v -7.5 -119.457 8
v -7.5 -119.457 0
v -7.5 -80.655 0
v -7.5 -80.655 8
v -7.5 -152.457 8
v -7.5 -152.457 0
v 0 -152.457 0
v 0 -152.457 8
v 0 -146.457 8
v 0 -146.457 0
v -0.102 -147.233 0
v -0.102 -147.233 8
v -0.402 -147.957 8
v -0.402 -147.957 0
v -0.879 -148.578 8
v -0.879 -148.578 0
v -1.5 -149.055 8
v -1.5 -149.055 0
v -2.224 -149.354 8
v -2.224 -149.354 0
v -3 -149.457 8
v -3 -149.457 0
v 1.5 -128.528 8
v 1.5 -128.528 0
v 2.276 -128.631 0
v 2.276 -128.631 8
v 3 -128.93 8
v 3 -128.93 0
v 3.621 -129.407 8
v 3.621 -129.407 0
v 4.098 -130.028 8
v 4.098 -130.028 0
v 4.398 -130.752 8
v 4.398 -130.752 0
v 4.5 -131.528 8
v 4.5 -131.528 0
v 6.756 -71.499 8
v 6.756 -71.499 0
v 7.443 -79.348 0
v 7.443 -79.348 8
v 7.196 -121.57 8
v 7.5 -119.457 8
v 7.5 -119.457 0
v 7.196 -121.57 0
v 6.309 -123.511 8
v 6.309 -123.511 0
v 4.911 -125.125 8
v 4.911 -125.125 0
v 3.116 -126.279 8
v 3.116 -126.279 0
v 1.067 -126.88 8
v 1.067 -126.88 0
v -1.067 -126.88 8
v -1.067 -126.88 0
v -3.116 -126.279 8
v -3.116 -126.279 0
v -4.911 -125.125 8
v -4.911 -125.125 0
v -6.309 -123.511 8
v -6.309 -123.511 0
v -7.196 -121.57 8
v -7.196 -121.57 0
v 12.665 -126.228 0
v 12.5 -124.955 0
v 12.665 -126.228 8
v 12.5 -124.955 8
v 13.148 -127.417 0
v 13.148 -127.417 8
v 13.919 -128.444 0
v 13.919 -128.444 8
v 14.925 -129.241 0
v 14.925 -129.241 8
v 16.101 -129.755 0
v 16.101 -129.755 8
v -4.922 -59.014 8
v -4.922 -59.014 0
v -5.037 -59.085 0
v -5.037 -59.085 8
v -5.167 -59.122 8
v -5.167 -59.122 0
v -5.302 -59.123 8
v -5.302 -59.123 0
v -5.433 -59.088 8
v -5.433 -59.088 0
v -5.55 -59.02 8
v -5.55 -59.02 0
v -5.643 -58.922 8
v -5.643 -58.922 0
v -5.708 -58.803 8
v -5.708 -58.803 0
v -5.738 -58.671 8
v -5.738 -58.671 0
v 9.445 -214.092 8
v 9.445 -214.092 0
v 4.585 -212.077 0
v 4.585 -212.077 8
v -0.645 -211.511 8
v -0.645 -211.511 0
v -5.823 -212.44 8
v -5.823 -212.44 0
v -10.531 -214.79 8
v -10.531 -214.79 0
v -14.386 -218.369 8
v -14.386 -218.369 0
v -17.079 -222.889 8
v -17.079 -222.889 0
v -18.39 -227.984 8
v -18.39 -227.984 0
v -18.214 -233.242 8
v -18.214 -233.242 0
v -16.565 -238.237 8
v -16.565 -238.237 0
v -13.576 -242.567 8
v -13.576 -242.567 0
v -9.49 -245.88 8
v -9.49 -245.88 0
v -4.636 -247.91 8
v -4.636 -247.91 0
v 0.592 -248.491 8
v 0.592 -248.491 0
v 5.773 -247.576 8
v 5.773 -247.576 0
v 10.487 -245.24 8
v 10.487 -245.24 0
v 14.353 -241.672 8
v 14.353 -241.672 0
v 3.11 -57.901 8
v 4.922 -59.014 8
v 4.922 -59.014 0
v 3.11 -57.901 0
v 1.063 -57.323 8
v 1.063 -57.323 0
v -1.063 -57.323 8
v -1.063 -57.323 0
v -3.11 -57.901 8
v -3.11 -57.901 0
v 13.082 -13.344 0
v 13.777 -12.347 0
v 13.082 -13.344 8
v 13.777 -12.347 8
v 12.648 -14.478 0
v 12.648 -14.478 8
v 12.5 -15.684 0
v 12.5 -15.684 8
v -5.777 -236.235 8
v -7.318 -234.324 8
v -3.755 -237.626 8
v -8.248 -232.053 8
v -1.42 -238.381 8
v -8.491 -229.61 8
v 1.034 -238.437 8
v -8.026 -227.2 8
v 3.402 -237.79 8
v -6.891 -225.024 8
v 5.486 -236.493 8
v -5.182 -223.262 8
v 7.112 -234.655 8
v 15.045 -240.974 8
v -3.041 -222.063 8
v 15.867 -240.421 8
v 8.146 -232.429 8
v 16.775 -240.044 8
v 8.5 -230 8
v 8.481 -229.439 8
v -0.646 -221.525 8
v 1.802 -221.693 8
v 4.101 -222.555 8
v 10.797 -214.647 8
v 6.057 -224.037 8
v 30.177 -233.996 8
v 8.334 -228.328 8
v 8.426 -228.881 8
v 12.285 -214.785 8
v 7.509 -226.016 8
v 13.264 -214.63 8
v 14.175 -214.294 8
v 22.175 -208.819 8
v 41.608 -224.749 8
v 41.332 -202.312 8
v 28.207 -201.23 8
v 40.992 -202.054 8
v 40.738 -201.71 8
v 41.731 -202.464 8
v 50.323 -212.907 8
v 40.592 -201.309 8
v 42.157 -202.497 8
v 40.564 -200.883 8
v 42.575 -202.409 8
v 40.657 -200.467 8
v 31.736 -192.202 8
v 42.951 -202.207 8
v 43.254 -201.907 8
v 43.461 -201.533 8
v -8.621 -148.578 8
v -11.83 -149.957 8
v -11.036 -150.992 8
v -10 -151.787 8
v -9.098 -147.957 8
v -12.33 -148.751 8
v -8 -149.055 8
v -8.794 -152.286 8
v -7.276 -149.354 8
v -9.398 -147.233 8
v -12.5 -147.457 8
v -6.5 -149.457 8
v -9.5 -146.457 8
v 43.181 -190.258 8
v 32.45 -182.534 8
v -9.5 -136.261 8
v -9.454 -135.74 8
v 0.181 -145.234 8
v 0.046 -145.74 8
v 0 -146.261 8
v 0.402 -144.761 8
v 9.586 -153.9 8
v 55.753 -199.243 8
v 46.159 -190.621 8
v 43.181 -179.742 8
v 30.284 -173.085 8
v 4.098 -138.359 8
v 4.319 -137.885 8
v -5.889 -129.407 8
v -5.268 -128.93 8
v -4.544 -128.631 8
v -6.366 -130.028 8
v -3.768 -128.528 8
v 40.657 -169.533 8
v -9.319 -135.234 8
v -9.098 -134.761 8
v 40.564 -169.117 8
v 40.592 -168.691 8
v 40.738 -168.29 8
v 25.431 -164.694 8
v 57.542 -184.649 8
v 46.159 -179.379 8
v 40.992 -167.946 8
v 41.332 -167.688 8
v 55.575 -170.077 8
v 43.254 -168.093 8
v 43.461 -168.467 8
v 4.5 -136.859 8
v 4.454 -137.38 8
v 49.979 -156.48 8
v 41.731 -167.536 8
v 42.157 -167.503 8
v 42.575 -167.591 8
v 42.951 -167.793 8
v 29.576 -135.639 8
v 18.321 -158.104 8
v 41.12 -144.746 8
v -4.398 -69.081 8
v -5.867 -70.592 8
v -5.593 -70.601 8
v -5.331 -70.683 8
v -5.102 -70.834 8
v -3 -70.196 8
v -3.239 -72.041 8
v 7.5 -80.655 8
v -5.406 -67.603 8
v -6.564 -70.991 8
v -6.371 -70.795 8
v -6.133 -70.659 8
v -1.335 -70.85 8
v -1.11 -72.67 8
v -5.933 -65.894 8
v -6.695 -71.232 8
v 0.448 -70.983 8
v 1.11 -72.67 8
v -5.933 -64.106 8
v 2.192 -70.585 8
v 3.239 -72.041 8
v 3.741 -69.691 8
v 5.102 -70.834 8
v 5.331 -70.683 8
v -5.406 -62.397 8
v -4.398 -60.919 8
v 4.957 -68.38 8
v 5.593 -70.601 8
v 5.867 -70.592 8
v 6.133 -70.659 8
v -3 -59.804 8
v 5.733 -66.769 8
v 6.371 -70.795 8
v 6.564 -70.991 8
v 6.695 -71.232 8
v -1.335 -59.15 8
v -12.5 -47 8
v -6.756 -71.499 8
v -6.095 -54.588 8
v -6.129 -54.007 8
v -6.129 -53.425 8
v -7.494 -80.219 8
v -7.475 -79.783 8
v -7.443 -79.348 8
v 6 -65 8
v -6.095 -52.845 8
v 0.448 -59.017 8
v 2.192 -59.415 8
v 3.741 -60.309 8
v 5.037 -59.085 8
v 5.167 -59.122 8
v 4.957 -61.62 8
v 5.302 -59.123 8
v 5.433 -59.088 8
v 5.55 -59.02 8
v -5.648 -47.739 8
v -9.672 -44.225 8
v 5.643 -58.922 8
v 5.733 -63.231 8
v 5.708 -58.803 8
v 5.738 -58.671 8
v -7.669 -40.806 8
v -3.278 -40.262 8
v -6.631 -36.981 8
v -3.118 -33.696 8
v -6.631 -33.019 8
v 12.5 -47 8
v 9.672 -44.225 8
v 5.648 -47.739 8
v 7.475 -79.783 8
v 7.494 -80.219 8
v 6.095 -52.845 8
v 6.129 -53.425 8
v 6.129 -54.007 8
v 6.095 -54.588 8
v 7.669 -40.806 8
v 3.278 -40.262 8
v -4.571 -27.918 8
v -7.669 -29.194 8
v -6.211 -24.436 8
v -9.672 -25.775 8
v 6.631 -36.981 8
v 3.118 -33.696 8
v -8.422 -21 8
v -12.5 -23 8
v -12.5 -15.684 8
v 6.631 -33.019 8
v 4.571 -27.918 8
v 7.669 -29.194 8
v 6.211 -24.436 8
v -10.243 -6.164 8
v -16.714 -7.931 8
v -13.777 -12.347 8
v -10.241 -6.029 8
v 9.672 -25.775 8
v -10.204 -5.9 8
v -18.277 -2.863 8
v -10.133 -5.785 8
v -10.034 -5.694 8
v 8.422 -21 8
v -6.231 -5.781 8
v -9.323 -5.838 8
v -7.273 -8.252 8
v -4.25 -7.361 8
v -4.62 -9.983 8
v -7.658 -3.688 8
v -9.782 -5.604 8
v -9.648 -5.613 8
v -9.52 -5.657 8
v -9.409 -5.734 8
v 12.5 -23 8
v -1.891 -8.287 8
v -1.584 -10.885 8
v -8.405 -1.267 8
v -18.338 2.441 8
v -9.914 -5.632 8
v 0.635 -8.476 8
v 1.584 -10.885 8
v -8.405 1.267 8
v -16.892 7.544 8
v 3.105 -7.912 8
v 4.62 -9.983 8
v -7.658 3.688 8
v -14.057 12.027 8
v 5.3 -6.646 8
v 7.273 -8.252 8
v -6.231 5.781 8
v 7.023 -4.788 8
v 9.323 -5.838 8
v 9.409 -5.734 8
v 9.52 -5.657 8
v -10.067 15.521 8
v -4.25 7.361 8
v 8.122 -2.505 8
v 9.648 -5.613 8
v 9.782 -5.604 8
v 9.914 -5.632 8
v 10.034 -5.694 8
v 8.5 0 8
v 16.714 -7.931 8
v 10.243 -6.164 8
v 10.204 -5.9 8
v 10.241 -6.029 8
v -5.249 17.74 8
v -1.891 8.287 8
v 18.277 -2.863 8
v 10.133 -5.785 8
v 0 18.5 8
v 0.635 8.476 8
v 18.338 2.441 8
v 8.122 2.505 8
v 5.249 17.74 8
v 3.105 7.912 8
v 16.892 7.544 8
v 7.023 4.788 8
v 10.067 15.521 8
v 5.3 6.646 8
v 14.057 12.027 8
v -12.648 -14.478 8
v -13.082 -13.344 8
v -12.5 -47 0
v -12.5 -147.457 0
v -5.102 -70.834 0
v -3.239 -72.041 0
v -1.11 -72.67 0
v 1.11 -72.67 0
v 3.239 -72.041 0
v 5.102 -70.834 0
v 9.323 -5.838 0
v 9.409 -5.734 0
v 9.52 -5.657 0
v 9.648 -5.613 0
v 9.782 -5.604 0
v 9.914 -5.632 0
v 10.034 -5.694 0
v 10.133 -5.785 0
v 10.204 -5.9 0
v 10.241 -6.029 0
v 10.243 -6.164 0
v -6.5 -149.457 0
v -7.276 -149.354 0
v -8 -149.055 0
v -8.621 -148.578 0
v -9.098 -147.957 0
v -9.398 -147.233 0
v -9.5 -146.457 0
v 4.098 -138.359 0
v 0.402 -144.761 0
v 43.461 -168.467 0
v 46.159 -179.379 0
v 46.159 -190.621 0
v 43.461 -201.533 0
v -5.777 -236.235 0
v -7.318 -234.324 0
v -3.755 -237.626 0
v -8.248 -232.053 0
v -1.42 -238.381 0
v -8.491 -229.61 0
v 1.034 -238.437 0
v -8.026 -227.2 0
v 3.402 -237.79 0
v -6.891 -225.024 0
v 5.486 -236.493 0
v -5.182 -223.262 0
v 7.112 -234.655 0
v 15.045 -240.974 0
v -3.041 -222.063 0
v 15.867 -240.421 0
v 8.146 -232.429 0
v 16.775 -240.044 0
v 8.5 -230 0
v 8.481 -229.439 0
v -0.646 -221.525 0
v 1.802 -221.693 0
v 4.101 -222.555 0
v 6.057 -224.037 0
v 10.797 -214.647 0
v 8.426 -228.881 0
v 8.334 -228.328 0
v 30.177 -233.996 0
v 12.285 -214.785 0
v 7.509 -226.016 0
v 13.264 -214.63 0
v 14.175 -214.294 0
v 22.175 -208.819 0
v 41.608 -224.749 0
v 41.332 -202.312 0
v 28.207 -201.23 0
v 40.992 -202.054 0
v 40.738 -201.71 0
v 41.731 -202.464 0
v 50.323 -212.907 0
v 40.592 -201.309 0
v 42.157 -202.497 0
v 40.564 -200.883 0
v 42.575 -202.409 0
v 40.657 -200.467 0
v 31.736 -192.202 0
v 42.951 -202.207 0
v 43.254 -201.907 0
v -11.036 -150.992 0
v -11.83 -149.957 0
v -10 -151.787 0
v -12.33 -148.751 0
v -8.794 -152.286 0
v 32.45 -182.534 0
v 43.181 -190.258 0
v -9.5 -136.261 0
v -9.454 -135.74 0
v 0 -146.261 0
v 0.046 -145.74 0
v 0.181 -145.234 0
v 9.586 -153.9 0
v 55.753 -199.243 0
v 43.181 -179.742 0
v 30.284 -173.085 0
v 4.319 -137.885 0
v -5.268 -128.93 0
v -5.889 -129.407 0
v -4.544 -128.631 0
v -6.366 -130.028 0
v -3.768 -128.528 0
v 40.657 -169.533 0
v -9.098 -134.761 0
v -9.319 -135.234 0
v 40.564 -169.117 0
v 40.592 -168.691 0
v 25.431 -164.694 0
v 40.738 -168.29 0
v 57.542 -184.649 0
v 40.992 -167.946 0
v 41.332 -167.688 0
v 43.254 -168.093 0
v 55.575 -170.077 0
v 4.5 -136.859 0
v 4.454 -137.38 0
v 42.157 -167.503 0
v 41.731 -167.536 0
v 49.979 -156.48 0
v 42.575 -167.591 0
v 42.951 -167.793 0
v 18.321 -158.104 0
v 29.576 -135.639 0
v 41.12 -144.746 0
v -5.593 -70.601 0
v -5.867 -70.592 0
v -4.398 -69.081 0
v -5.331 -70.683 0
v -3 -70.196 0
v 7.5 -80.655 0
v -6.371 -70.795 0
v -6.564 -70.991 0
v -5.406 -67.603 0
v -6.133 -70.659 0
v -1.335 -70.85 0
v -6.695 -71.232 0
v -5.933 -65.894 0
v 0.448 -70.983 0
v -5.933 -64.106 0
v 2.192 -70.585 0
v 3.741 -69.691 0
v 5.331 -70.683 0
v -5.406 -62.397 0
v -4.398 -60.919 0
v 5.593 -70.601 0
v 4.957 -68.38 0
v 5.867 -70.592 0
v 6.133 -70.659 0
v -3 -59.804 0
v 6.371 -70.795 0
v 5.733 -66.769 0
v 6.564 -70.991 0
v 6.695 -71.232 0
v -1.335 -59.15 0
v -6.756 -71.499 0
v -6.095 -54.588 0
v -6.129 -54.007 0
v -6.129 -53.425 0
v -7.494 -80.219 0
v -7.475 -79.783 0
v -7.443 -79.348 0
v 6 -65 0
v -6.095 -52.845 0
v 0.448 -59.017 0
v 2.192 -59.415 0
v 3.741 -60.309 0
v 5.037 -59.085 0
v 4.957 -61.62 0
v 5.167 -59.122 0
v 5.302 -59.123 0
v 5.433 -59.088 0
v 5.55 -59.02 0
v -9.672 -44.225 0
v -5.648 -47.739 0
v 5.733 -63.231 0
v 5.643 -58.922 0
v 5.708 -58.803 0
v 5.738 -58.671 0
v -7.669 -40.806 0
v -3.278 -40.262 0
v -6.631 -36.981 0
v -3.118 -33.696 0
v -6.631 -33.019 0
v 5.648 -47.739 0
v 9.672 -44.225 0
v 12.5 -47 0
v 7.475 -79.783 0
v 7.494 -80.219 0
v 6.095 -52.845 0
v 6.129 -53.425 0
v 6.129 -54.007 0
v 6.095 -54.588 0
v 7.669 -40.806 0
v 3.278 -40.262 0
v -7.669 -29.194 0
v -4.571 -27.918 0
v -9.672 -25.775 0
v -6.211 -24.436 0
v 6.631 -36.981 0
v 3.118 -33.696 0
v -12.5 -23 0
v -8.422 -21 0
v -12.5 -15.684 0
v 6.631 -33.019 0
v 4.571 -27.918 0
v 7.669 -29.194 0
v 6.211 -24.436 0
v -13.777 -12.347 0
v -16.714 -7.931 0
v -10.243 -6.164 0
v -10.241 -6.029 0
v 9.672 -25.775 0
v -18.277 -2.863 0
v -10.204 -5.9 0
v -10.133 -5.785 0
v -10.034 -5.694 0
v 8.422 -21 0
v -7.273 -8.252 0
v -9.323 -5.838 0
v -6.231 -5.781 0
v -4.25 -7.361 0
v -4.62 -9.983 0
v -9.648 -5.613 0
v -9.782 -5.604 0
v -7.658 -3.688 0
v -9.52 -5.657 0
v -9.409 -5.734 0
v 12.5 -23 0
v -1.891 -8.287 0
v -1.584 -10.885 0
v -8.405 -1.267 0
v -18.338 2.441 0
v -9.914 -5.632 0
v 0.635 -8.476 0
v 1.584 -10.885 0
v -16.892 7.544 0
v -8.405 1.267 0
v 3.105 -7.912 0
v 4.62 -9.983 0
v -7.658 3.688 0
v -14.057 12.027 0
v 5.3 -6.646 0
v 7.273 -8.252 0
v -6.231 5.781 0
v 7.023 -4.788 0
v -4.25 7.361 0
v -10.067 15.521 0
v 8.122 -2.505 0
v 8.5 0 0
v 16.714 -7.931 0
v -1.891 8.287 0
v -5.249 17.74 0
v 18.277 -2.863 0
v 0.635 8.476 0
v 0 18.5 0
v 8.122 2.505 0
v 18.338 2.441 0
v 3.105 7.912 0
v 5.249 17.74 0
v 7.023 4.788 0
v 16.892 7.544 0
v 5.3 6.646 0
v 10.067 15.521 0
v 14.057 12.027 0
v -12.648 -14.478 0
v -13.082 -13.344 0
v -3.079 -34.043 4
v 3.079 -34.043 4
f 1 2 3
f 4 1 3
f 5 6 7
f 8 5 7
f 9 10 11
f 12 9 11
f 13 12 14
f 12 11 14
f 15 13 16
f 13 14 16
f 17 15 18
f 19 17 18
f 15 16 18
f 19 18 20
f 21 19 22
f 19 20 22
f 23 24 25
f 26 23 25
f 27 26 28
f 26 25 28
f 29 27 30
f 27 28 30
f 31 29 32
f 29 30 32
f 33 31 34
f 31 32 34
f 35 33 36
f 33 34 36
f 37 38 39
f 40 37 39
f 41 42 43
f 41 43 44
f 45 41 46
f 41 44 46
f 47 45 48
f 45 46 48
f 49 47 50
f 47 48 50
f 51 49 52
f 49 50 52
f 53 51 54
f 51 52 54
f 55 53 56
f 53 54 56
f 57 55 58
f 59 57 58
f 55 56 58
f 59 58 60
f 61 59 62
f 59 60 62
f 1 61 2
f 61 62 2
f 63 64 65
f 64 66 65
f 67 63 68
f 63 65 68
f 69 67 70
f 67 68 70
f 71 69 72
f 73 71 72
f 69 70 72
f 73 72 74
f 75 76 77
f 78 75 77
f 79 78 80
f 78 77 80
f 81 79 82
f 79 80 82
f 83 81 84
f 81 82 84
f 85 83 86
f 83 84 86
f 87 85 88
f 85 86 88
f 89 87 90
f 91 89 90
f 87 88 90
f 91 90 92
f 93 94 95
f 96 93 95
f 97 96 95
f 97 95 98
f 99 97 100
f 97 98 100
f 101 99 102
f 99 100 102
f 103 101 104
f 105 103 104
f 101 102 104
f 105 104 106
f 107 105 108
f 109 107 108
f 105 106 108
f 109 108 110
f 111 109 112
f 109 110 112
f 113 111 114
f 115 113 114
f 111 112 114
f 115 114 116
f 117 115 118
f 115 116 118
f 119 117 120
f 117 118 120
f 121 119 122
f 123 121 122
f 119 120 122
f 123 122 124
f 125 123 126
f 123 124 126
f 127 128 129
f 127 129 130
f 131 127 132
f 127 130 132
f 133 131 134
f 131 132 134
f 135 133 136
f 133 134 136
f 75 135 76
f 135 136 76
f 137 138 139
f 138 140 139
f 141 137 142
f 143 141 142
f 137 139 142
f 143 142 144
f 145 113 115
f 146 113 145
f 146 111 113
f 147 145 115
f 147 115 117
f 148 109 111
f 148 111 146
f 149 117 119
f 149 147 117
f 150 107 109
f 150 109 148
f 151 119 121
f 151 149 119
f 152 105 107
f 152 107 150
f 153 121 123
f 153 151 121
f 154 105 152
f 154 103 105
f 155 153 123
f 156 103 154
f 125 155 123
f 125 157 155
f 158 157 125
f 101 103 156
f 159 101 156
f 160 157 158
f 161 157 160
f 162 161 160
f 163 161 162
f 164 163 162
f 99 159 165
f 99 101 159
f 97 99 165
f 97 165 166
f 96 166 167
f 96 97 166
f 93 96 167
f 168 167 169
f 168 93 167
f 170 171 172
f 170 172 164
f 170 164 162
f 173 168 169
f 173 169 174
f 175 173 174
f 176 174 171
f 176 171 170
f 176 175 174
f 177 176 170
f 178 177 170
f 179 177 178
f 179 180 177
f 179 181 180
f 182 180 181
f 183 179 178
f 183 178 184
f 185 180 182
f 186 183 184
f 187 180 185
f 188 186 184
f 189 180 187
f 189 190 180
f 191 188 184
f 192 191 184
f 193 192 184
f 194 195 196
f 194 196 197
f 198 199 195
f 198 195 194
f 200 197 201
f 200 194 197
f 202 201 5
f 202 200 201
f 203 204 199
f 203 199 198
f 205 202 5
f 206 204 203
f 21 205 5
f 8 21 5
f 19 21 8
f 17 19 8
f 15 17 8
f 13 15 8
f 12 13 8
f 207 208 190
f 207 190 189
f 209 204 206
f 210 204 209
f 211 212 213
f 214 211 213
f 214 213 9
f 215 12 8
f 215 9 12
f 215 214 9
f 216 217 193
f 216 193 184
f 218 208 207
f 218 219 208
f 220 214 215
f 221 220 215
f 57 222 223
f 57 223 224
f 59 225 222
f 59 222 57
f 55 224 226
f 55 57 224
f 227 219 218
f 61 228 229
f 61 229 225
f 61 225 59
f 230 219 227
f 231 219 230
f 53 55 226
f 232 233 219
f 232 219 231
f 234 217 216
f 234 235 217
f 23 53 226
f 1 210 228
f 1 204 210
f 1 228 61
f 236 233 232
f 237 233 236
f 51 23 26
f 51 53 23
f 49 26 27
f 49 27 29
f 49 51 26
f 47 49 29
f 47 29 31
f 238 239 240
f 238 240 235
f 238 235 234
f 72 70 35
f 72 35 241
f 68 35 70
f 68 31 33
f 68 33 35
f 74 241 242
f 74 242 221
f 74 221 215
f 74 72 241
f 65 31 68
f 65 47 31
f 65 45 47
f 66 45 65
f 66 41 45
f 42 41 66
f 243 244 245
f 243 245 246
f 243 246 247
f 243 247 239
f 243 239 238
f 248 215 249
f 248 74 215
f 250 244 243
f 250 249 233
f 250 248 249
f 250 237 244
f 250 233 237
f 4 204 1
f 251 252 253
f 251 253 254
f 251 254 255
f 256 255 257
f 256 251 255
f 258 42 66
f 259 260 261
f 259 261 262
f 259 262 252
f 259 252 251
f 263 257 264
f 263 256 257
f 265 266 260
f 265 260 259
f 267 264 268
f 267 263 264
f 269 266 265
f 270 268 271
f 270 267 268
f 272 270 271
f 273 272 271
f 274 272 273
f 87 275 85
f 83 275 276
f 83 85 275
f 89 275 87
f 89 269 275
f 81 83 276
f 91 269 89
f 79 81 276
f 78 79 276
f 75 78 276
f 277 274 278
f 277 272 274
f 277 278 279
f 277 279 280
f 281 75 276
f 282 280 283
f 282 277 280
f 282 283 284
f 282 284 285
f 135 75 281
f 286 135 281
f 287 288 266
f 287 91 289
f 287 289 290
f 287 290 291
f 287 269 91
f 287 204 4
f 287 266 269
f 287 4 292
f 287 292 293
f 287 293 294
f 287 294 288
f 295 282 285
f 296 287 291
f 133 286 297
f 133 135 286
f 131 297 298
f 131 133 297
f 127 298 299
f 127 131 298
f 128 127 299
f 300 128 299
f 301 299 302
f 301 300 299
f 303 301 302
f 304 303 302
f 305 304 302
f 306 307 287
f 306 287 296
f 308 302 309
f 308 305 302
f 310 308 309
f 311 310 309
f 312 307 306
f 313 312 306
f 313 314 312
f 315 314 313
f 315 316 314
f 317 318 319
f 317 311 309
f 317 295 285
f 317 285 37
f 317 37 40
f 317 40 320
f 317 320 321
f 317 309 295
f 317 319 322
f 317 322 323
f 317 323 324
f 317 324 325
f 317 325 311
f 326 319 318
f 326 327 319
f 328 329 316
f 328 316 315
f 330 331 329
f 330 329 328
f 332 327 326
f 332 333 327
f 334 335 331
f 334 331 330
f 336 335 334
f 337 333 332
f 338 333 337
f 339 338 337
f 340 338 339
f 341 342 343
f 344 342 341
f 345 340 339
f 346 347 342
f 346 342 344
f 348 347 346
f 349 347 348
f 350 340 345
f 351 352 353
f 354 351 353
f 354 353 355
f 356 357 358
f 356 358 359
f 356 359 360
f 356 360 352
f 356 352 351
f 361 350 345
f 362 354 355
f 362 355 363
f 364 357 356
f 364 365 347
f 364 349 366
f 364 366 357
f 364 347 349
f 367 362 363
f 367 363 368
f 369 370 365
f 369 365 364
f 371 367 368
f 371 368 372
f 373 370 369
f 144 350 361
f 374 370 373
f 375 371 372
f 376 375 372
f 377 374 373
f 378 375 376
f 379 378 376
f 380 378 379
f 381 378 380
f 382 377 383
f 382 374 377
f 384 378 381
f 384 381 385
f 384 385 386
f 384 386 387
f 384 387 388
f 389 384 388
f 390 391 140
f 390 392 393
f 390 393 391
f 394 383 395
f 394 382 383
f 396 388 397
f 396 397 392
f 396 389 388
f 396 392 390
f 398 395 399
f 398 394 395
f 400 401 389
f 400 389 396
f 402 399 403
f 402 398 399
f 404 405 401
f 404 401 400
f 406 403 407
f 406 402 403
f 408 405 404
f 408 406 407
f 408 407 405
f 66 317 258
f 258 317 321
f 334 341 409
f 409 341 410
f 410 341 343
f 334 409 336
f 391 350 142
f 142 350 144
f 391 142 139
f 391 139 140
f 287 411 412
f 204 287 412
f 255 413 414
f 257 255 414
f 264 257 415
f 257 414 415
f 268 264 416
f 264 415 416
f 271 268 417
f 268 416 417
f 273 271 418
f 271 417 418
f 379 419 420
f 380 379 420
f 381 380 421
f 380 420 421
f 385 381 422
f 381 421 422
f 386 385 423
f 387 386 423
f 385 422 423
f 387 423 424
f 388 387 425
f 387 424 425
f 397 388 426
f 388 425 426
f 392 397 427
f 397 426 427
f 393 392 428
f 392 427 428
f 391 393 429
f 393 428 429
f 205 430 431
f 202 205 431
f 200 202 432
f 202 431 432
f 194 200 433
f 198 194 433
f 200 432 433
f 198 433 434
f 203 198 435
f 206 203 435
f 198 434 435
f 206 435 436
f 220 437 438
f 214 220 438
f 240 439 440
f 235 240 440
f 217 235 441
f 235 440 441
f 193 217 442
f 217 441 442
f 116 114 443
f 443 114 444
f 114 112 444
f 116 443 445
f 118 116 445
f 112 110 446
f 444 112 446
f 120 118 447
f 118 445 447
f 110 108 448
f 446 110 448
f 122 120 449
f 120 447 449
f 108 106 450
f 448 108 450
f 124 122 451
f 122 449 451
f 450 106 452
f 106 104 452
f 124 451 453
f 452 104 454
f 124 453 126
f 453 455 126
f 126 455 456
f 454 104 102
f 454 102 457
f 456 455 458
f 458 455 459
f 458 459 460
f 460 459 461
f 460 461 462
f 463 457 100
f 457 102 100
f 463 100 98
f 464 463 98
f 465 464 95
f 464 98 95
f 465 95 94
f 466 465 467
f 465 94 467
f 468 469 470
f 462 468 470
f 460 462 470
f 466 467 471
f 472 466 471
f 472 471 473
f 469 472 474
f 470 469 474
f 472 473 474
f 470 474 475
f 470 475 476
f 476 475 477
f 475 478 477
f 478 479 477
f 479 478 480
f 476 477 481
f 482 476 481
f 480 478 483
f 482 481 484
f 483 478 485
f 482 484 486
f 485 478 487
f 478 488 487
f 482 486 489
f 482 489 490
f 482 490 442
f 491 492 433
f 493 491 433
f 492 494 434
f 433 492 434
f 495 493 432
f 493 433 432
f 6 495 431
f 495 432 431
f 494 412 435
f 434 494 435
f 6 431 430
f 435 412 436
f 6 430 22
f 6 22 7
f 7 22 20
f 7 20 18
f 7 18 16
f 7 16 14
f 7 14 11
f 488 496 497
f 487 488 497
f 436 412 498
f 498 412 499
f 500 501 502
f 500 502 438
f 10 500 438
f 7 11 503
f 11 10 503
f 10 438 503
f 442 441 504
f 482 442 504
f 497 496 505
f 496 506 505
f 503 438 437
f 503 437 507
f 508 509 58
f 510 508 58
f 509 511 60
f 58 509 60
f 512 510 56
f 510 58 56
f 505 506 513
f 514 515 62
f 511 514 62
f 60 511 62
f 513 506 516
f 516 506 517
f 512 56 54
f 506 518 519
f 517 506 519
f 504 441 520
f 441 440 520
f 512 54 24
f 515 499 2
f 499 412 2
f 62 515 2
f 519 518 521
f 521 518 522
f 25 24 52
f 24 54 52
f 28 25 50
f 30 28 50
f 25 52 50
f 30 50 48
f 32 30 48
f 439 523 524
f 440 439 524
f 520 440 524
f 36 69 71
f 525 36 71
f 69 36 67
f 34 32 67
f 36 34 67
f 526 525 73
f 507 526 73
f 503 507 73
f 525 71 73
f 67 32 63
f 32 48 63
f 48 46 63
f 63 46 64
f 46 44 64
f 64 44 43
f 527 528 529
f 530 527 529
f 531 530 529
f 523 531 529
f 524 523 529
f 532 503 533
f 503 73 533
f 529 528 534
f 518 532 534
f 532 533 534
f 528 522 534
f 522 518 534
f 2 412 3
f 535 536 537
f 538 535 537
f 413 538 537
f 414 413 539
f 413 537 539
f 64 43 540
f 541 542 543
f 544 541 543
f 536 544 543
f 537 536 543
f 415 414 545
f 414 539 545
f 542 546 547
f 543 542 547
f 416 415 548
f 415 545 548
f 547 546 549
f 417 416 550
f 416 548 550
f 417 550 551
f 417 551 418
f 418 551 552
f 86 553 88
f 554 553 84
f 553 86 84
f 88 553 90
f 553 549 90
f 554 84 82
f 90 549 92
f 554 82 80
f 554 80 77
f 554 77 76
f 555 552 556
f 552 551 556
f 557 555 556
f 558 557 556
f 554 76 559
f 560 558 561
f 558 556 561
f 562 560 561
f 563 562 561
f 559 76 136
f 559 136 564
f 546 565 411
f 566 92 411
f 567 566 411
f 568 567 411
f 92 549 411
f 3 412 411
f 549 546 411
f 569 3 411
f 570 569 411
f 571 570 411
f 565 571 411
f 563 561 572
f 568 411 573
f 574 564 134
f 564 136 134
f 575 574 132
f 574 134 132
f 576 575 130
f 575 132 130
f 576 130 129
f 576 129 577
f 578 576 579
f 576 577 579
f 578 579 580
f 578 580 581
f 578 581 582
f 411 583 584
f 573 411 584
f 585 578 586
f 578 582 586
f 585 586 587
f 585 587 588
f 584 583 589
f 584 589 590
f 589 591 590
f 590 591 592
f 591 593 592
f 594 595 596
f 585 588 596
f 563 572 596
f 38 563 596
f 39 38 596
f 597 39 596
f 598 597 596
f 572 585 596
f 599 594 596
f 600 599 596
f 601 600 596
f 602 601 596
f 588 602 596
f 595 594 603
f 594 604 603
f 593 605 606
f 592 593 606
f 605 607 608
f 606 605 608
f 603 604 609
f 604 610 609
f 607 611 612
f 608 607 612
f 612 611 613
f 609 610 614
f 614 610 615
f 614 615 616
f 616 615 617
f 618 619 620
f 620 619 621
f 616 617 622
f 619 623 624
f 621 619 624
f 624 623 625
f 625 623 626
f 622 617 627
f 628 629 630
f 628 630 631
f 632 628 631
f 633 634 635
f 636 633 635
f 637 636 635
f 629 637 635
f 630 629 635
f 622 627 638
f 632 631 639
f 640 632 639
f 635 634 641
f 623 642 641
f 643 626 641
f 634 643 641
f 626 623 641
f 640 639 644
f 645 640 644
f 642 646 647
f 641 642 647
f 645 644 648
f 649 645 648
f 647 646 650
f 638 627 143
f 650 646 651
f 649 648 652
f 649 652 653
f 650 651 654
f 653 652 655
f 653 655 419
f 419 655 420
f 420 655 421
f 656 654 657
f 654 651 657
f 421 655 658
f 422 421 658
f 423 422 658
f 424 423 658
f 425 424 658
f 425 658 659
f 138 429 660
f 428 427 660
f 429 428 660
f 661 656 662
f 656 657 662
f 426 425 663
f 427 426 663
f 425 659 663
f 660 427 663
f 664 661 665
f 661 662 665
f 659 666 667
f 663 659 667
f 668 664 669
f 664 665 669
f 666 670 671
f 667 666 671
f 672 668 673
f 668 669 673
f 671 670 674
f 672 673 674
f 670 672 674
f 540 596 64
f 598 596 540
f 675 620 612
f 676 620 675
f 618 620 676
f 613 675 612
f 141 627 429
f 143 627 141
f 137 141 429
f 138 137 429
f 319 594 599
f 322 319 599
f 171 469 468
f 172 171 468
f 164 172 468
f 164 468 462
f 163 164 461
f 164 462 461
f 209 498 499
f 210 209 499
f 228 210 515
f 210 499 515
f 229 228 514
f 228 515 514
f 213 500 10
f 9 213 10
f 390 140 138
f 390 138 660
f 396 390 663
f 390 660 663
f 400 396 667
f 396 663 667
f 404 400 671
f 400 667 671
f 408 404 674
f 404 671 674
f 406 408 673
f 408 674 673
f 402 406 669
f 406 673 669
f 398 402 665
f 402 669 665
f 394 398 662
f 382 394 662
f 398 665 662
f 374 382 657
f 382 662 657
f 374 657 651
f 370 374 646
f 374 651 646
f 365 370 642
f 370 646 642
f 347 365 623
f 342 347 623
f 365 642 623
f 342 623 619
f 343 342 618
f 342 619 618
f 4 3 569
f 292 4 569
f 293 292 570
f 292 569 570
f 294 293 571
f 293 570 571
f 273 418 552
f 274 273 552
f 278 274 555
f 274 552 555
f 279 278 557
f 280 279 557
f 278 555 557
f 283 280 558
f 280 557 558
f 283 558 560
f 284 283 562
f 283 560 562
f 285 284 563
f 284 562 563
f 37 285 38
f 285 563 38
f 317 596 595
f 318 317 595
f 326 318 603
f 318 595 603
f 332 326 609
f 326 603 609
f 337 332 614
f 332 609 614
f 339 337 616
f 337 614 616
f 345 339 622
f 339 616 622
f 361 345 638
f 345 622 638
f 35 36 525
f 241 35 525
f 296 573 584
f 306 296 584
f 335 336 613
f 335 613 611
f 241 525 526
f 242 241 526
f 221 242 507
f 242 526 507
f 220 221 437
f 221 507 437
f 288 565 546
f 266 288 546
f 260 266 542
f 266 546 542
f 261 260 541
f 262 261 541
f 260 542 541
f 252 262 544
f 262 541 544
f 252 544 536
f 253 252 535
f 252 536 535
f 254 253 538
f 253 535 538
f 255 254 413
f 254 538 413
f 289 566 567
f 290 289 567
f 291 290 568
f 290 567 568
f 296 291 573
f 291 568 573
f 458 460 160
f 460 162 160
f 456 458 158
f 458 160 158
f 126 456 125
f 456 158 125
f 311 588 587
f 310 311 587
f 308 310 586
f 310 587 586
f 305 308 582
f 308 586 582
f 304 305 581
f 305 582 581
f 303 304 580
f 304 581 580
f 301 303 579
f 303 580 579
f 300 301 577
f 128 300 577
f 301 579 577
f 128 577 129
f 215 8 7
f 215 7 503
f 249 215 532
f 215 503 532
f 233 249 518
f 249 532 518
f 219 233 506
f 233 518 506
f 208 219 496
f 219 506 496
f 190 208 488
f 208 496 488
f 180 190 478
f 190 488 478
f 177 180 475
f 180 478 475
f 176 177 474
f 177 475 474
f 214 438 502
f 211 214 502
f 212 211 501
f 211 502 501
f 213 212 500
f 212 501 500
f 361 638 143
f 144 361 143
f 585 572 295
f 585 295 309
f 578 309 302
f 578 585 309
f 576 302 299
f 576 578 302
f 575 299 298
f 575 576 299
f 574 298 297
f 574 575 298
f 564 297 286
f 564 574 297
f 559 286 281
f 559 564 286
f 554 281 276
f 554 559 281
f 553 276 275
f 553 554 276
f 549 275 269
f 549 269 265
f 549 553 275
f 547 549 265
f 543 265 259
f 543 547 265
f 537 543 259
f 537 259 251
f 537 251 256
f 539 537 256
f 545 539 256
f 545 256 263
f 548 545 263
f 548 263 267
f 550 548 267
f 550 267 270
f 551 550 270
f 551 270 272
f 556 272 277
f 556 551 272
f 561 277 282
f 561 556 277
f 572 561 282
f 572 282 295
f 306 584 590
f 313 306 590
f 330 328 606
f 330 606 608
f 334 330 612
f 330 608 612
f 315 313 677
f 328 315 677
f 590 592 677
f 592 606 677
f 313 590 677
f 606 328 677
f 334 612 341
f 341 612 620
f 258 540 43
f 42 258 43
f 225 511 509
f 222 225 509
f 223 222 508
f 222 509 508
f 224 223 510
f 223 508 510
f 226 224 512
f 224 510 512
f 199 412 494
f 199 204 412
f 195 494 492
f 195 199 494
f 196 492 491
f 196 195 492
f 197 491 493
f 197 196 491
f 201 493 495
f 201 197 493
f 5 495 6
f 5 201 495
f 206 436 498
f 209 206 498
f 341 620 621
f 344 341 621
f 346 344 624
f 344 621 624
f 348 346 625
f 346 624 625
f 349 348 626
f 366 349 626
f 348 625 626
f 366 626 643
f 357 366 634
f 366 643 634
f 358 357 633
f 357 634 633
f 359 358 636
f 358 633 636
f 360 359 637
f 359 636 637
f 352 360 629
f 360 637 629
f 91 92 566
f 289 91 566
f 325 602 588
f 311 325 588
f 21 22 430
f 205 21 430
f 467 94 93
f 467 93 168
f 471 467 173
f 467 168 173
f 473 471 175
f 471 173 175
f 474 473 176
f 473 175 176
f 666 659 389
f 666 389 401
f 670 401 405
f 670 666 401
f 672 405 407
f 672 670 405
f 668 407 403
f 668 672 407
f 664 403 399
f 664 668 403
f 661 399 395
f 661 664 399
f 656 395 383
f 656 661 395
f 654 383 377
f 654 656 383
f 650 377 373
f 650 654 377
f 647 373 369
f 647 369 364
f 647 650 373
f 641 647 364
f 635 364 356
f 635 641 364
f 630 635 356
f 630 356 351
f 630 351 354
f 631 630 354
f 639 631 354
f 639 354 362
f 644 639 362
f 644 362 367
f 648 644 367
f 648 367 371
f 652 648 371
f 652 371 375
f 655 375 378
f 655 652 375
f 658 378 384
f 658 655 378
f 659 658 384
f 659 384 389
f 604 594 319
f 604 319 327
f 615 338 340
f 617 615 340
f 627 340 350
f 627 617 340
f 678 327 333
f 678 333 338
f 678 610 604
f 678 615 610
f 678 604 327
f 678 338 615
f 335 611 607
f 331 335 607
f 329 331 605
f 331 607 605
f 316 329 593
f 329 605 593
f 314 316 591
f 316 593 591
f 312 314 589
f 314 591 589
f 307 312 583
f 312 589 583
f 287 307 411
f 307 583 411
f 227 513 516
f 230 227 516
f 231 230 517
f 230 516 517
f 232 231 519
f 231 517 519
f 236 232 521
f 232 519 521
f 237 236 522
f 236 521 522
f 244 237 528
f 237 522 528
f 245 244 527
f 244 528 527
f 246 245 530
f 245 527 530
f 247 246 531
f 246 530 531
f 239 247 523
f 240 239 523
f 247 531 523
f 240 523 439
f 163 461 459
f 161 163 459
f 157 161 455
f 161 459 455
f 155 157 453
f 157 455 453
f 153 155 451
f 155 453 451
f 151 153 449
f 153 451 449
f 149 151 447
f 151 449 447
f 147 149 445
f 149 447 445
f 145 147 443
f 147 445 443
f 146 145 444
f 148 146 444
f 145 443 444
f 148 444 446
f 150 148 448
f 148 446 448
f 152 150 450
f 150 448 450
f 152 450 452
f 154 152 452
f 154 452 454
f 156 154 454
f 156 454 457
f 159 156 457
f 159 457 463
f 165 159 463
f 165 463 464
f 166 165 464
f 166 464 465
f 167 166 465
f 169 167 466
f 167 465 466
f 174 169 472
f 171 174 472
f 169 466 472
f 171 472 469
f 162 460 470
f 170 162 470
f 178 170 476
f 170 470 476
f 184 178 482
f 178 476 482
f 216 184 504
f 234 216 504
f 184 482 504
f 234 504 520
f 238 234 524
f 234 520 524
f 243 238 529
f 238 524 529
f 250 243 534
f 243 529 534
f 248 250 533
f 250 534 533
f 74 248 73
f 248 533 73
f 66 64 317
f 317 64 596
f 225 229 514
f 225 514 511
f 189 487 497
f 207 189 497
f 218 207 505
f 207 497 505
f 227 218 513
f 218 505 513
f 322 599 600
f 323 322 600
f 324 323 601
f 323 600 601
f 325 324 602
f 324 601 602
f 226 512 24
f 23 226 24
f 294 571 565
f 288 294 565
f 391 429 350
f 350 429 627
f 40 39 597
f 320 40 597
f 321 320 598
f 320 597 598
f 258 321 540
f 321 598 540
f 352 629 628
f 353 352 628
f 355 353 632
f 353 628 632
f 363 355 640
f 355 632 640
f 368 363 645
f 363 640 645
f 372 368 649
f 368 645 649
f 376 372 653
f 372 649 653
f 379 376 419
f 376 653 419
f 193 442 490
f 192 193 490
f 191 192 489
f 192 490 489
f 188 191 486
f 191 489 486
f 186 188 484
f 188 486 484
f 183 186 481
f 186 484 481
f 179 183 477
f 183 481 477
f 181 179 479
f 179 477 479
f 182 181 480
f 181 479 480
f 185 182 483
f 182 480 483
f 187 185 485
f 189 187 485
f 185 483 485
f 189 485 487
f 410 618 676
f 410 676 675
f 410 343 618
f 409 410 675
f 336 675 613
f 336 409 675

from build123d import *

# Parameters (mm, degrees)
SKETCH1_R           = 6
SKETCH1_R_2         = 8.5
BOSS_EXTRUDE1_DEPTH = 8
FILLET1_R           = 5


with BuildPart() as part:
    # Sketch1 → Boss-Extrude1 (new body)
    with BuildSketch(Plane.XY):
        with BuildLine():
            ThreePointArc((12.5, -13.638181697), (0, 18.5), (-12.5, -13.638181697))
            Line((-12.5, -13.638181697), (-12.5, -23))
            ThreePointArc((-12.5, -23), (-6.5, -35), (-12.5, -47))
            Line((-12.5, -47), (-12.5, -152.456671403))
            Line((-12.5, -152.456671403), (0, -152.456671403))
            ThreePointArc((0, -152.456671403), (32.019441409, -179.184193262), (11.444366088, -215.464647068))
            ThreePointArc((11.444366088, -215.464647068), (-18.29086587, -232.773846738), (15.239317045, -240.488718511))
            ThreePointArc((15.239317045, -240.488718511), (57.52601951, -183.58870793), (12.5, -128.830749818))
            Line((12.5, -128.830749818), (12.5, -47))
            ThreePointArc((12.5, -47), (6.5, -35), (12.5, -23))
            Line((12.5, -23), (12.5, -13.638181697))
        make_face()
        with BuildLine():
            ThreePointArc((8.333859781, -228.327642037), (8.458362966, -229.159704854), (8.5, -230))
            ThreePointArc((8.5, -230), (-8.458362966, -230.840295146), (8.333859781, -228.327642037))
        make_face(mode=Mode.SUBTRACT)
        with BuildLine():
            ThreePointArc((0, -146.456671403), (-0.878679656, -148.577991747), (-3, -149.456671403))
            Line((-3, -149.456671403), (-6.5, -149.456671403))
            ThreePointArc((-6.5, -149.456671403), (-8.621320344, -148.577991747), (-9.5, -146.456671403))
            Line((-9.5, -146.456671403), (-9.5, -136.26051898))
            ThreePointArc((-9.5, -136.26051898), (-9.397777479, -135.484061845), (-9.098076211, -134.76051898))
            Line((-9.098076211, -134.76051898), (-6.366025404, -130.028468173))
            ThreePointArc((-6.366025404, -130.028468173), (-5.267949192, -128.930391962), (-3.767949192, -128.528468173))
            Line((-3.767949192, -128.528468173), (1.5, -128.528468173))
            ThreePointArc((1.5, -128.528468173), (3.621320344, -129.407147829), (4.5, -131.528468173))
            Line((4.5, -131.528468173), (4.5, -136.858595192))
            ThreePointArc((4.5, -136.858595192), (4.397777479, -137.635052327), (4.098076211, -138.358595192))
            Line((4.098076211, -138.358595192), (0.401923789, -144.76051898))
            ThreePointArc((0.401923789, -144.76051898), (0.102222521, -145.484061845), (0, -146.26051898))
            Line((0, -146.26051898), (0, -146.456671403))
        make_face(mode=Mode.SUBTRACT)
        with BuildLine():
            ThreePointArc((43.461464413, -168.466666667), (46.5, -185), (43.461464413, -201.533333333))
            ThreePointArc((43.461464413, -201.533333333), (41.526148356, -202.401982723), (40.657498967, -200.466666667))
            ThreePointArc((40.657498967, -200.466666667), (43.5, -185), (40.657498967, -169.533333333))
            ThreePointArc((40.657498967, -169.533333333), (41.526148356, -167.598017277), (43.461464413, -168.466666667))
        make_face(mode=Mode.SUBTRACT)
        with BuildLine():
            ThreePointArc((7.5, -119.456671403), (0, -126.956671403), (-7.5, -119.456671403))
            Line((-7.5, -119.456671403), (-7.5, -80.654914144))
            ThreePointArc((-7.5, -80.654914144), (-7.485723324, -80.000623333), (-7.442920471, -79.347578002))
            Line((-7.442920471, -79.347578002), (-6.756300289, -71.499473409))
            ThreePointArc((-6.756300289, -71.499473409), (-6.133334804, -70.658889988), (-5.101807809, -70.833871534))
            ThreePointArc((-5.101807809, -70.833871534), (0, -72.75), (5.101807809, -70.833871534))
            ThreePointArc((5.101807809, -70.833871534), (6.133334804, -70.658889988), (6.756300289, -71.499473409))
            Line((6.756300289, -71.499473409), (7.442920471, -79.347578002))
            ThreePointArc((7.442920471, -79.347578002), (7.485723324, -80.000623333), (7.5, -80.654914144))
            Line((7.5, -80.654914144), (7.5, -119.456671403))
        make_face(mode=Mode.SUBTRACT)
        with Locations((0, -65)):
            Circle(SKETCH1_R, mode=Mode.SUBTRACT)
        with BuildLine():
            Line((-8.421524221, -21), (-10.243145112, -6.164088407))
            ThreePointArc((-10.243145112, -6.164088407), (-9.913994973, -5.631910779), (-9.323094991, -5.837799225))
            ThreePointArc((-9.323094991, -5.837799225), (0, -11), (9.323094991, -5.837799225))
            ThreePointArc((9.323094991, -5.837799225), (9.913994973, -5.631910779), (10.243145112, -6.164088407))
            Line((10.243145112, -6.164088407), (8.421524221, -21))
            add(Edge.make_bspline(
                [(5.648127088, -47.738954624), (-0.877088936, -33.717206836), (8.421524221, -21)],
                knots=[0, 0, 0, 1, 1, 1], degree=2))
            Line((5.648127088, -47.738954624), (6.09481015, -52.844565385))
            ThreePointArc((6.09481015, -52.844565385), (6.132863169, -53.716122812), (6.09481015, -54.58768024))
            Line((6.09481015, -54.58768024), (5.737570571, -58.670947304))
            ThreePointArc((5.737570571, -58.670947304), (5.433124471, -59.088345781), (4.921929391, -59.013589467))
            ThreePointArc((4.921929391, -59.013589467), (0, -57.25), (-4.921929391, -59.013589467))
            ThreePointArc((-4.921929391, -59.013589467), (-5.433124471, -59.088345781), (-5.737570571, -58.670947304))
            Line((-5.737570571, -58.670947304), (-6.09481015, -54.58768024))
            ThreePointArc((-6.09481015, -54.58768024), (-6.132863169, -53.716122812), (-6.09481015, -52.844565385))
            Line((-6.09481015, -52.844565385), (-5.648127088, -47.738954624))
            add(Edge.make_bspline(
                [(-5.648127088, -47.738954624), (0.877088936, -33.717206836), (-8.421524221, -21)],
                knots=[0, 0, 0, 1, 1, 1], degree=2))
        make_face(mode=Mode.SUBTRACT)
        Circle(SKETCH1_R_2, mode=Mode.SUBTRACT)
    extrude(amount=BOSS_EXTRUDE1_DEPTH)

    # Fillet1
    fillet1_edges = [part.edges().sort_by_distance(p)[0] for p in [
        (11.444366088, -215.464647068, 4),
        (-12.5, -152.456671403, 4),
        (-12.5, -13.638181697, 4),
        (12.5, -13.638181697, 4),
        (12.5, -128.830749818, 4),
        (15.239317045, -240.488718511, 4),
    ]]
    fillet(fillet1_edges, radius=FILLET1_R)


solid = part.part
